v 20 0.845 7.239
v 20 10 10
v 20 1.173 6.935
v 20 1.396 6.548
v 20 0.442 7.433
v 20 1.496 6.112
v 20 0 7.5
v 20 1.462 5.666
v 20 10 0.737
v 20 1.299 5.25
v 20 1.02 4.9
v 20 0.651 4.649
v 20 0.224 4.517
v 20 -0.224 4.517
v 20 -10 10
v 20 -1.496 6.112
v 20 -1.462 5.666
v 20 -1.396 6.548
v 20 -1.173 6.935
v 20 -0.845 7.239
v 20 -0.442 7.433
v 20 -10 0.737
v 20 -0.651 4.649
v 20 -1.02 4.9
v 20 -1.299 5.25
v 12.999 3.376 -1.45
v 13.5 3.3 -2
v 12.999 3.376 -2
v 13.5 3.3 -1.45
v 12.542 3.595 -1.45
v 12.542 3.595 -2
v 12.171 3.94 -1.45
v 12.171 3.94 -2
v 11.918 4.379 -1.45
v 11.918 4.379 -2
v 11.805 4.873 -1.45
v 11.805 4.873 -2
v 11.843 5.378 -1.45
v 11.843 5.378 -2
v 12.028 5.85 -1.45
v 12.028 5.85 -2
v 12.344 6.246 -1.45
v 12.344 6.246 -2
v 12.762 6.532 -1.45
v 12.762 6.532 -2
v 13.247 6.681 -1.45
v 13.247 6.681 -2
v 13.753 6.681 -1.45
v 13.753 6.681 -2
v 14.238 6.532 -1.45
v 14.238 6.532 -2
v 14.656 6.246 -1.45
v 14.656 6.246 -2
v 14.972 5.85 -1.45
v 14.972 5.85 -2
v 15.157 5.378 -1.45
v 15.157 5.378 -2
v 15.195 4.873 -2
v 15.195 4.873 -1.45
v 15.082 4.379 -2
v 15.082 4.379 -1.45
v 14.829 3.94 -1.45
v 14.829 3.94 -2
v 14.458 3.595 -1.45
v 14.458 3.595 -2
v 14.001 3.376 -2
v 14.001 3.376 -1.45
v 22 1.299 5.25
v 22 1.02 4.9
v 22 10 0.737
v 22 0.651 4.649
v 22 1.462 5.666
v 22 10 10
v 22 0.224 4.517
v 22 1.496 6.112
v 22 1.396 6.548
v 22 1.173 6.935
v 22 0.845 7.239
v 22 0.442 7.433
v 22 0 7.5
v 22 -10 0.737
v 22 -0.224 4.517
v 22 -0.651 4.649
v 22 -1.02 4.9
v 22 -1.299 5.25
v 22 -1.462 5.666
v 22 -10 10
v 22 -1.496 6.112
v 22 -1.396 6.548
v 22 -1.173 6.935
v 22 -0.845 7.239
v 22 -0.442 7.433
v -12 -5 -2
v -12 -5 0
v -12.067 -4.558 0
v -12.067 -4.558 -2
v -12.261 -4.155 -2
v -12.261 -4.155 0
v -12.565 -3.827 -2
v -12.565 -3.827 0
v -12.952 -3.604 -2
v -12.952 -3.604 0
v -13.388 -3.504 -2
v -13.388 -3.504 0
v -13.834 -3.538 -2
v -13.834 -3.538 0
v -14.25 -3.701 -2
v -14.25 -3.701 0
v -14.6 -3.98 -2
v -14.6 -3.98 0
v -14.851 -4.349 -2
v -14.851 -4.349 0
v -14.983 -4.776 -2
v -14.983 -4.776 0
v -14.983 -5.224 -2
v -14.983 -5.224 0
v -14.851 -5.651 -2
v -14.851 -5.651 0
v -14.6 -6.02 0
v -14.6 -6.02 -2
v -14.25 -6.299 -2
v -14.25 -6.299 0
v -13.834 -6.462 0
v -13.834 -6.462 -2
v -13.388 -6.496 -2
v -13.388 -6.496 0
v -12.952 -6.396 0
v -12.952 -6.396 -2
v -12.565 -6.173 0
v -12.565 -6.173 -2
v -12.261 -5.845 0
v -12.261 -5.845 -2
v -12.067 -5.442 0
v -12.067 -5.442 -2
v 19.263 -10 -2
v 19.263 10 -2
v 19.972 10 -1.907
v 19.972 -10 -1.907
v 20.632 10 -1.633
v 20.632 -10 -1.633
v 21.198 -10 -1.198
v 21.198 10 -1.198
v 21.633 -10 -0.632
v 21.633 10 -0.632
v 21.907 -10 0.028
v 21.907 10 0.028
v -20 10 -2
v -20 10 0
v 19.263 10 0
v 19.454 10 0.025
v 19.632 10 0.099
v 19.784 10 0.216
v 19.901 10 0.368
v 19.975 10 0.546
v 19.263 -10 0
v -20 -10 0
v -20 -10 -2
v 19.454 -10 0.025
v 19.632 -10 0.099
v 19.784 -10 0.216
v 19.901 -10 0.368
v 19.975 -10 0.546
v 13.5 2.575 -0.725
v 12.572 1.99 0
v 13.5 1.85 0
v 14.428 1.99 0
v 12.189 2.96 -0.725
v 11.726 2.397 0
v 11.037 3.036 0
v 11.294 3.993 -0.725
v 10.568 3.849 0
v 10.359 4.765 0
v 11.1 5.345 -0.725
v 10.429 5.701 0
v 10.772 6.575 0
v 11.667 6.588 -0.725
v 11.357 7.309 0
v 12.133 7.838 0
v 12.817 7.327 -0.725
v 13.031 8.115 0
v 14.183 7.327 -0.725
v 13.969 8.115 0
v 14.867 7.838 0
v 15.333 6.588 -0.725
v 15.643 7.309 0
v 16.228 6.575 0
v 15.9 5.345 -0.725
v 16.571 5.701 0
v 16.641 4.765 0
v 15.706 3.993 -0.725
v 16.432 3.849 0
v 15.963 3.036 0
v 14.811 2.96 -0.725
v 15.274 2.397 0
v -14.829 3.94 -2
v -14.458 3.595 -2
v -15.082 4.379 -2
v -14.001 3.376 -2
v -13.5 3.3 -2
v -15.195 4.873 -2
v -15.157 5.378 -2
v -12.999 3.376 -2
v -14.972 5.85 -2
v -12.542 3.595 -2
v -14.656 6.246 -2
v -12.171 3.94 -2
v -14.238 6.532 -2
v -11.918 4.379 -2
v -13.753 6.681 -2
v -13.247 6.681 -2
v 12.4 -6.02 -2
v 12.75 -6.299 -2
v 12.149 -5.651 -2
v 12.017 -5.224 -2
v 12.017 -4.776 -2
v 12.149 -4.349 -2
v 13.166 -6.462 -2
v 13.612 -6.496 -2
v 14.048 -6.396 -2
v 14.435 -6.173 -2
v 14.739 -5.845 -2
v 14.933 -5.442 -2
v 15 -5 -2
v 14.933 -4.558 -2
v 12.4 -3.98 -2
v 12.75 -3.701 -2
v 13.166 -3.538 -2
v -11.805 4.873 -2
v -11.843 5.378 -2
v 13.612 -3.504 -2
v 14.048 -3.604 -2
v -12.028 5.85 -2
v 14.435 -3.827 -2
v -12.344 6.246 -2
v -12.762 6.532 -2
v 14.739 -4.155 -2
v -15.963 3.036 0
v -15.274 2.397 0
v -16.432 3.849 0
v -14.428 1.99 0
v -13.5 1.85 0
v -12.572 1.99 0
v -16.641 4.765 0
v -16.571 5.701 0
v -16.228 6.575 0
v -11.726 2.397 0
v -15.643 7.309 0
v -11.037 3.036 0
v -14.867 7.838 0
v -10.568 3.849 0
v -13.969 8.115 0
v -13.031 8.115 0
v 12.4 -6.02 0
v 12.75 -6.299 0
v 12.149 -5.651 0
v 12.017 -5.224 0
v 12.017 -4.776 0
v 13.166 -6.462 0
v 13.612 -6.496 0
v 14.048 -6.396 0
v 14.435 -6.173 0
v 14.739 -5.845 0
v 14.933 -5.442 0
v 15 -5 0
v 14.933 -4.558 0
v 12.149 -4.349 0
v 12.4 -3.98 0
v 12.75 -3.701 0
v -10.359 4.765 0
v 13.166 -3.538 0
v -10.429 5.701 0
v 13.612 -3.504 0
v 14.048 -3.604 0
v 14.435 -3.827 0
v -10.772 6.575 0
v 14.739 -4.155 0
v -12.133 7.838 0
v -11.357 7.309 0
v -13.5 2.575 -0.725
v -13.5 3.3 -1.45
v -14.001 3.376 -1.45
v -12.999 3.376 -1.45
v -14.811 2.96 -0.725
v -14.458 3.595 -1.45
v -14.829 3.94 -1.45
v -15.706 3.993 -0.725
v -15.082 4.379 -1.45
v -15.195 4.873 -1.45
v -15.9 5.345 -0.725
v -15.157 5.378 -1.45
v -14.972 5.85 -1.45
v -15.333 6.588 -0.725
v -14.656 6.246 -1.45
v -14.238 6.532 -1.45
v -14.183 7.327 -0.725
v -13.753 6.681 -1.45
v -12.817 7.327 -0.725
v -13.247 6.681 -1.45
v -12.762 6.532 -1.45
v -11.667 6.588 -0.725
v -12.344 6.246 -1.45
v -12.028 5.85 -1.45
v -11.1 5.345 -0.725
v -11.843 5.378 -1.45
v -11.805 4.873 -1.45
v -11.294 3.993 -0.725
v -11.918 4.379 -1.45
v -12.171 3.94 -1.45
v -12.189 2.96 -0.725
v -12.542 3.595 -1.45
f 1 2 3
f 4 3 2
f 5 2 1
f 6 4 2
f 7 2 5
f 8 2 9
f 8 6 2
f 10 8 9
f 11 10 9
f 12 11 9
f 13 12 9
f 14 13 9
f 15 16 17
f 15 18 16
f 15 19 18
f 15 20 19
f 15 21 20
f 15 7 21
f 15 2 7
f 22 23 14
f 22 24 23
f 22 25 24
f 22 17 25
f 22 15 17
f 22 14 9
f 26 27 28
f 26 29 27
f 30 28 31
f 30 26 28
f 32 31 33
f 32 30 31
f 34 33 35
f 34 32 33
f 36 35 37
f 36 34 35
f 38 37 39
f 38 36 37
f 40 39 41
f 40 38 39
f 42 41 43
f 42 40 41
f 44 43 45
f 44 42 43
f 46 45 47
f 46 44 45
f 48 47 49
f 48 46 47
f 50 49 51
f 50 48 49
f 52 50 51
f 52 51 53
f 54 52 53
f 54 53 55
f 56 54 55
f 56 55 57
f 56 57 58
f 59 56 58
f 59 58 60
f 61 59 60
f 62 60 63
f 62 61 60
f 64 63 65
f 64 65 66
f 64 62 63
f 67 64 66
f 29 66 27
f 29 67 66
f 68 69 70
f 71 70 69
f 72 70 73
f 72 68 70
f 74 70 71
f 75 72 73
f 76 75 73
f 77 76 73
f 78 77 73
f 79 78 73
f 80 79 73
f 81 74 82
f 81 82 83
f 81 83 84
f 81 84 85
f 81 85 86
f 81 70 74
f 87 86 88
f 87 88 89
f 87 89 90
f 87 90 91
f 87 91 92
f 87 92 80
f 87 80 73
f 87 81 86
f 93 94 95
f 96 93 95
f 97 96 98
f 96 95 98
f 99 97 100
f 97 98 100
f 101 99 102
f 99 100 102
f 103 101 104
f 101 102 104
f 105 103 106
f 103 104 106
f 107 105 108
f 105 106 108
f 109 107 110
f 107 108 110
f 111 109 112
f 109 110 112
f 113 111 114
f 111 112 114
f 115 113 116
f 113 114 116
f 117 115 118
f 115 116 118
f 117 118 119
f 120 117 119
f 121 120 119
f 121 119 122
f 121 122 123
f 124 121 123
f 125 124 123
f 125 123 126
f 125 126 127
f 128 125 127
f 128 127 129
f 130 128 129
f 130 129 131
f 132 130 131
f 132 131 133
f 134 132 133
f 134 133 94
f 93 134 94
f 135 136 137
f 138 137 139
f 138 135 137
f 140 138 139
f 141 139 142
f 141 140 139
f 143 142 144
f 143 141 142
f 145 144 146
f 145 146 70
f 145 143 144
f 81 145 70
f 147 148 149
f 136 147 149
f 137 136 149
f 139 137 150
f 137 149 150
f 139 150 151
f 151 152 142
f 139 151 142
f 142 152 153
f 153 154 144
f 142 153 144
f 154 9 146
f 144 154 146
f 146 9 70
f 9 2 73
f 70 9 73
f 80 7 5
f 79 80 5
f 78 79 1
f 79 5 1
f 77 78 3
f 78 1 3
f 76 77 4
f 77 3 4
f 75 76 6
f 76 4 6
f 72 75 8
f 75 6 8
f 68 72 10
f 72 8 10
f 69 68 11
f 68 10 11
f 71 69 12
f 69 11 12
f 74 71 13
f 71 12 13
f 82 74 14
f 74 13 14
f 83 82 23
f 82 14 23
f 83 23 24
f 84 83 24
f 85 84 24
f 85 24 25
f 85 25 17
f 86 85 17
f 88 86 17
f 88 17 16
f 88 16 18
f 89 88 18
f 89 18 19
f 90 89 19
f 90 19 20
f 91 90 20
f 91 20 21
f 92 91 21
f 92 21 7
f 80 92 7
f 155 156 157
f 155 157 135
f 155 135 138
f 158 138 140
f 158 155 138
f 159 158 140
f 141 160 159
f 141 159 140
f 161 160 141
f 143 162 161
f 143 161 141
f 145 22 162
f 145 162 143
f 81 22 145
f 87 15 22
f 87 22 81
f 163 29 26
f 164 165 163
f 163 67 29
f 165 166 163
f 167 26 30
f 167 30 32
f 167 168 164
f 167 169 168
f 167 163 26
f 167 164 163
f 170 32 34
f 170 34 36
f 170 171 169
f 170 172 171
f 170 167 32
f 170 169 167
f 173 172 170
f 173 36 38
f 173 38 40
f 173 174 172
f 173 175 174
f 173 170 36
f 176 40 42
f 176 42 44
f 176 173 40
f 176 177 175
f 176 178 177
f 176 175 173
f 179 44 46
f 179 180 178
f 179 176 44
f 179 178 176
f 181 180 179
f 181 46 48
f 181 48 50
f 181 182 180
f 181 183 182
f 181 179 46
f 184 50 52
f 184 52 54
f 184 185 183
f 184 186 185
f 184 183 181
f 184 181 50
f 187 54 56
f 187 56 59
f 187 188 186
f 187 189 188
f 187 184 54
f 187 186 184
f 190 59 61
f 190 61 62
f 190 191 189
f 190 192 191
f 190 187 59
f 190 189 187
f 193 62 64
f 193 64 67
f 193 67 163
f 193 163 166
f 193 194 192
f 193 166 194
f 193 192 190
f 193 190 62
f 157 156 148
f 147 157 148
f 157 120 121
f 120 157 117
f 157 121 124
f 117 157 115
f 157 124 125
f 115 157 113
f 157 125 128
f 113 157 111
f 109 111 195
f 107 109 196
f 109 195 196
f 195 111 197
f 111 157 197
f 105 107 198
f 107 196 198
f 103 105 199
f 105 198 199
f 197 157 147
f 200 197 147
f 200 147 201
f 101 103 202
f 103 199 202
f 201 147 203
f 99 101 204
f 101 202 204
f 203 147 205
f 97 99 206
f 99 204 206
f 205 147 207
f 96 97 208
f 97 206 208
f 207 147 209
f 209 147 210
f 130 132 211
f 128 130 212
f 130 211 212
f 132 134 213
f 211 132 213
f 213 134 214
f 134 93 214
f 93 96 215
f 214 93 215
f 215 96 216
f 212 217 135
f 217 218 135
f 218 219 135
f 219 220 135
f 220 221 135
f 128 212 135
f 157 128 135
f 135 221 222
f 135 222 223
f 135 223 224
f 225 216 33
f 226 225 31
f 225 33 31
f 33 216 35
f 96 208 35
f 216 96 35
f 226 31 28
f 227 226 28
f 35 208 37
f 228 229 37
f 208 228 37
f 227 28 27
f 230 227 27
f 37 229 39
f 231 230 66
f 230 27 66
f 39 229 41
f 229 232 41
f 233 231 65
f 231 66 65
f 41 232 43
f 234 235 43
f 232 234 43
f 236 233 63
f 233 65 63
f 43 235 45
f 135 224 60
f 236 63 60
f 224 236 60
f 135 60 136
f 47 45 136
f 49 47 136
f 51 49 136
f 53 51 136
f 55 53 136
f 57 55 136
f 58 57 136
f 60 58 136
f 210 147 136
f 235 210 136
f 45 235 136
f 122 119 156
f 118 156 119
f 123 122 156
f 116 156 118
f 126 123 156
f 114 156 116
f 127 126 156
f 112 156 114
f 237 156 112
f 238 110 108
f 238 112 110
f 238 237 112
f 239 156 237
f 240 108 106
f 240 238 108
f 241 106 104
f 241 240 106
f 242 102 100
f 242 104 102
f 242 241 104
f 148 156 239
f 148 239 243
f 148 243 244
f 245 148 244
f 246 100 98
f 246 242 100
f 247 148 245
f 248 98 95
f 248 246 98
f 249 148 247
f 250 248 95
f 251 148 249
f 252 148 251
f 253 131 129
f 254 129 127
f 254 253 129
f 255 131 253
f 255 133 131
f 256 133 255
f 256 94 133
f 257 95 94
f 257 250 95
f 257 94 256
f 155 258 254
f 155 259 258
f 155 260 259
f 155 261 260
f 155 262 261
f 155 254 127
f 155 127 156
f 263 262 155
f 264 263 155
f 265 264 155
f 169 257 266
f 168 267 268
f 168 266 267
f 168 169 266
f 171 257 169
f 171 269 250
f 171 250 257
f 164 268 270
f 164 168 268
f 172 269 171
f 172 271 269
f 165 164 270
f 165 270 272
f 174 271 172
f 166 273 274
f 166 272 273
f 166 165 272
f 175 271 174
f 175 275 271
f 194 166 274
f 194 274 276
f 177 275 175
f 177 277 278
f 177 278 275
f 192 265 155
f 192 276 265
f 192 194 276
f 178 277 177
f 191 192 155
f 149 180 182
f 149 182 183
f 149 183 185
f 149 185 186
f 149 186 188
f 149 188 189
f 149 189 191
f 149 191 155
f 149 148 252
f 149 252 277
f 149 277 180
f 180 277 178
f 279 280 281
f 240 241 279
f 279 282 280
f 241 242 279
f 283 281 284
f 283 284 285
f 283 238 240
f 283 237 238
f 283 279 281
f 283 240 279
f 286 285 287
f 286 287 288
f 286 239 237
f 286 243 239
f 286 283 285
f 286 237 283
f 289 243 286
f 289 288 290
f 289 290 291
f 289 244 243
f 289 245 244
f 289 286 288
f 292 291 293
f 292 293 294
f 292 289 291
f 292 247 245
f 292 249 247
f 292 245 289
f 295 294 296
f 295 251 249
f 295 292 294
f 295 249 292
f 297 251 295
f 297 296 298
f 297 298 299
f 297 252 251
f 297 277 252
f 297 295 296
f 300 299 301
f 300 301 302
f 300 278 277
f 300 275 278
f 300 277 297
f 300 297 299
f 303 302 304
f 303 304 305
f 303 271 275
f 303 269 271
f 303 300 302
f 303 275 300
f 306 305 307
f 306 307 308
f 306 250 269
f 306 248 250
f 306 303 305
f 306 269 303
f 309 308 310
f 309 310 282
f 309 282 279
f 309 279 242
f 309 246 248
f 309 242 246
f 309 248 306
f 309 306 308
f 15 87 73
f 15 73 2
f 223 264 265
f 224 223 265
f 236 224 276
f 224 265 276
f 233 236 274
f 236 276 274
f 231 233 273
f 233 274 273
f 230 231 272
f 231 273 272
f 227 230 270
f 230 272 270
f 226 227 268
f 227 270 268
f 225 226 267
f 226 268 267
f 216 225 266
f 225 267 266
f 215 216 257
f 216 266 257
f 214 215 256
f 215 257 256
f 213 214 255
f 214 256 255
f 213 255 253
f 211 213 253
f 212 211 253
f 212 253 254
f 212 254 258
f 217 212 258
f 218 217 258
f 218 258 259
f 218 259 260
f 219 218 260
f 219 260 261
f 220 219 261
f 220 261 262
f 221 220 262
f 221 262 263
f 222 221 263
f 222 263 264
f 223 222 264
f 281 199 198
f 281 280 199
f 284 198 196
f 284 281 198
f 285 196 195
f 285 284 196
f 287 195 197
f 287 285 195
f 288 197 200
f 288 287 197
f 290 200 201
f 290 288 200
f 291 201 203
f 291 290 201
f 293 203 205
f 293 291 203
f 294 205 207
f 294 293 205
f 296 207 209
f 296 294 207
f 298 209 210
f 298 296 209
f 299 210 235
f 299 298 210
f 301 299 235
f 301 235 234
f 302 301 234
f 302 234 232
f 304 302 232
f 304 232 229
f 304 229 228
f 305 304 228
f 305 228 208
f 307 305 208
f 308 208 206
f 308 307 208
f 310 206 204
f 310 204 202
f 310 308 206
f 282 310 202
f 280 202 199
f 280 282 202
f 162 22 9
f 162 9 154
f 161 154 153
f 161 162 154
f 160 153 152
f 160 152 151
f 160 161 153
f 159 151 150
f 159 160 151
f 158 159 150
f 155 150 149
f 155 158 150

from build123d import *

# Parameters (mm, degrees)
SKETCH_1_W                       = 40
SKETCH_1_H                       = 20
SM_BASE_FLANGE_1_DEPTH           = 2
SM_EDGE_FLANGE_1_STRIP_W         = 9.4732
SM_EDGE_FLANGE_1_STRIP_H         = 2
SM_EDGE_FLANGE_1_STRIP_CUT_DEPTH = 20
SM_EDGE_FLANGE_1_DEPTH           = 20
HOLE_WIZARD_M3_2_AT_2_COUNT      = 2
HOLE_WIZARD_M3_2_AT_2_PITCH      = 27
HOLE_WIZARD_M3_1_D               = 3
HOLE_WIZARD_M3_2_2_D             = 3


# Sheet-metal steps are written as plain solids
with BuildPart() as part:
    # Sketch 1 → 基材-凸緣1 (new body)
    with BuildSketch(Plane.XY):
        Rectangle(SKETCH_1_W, SKETCH_1_H)
    extrude(amount=-SM_BASE_FLANGE_1_DEPTH)

    # 邊線-凸緣1 strip (across the edge) → 邊線-凸緣1 strip cut (cut)
    with BuildSketch(Plane(origin=(20, -10, 0), x_dir=(-1, 0, 0), z_dir=(0, 1, 0))):
        with Locations((-4, -1)):
            Rectangle(SM_EDGE_FLANGE_1_STRIP_W, SM_EDGE_FLANGE_1_STRIP_H)
    extrude(amount=SM_EDGE_FLANGE_1_STRIP_CUT_DEPTH, mode=Mode.SUBTRACT)

    # 邊線-凸緣1 section (across the edge) → 邊線-凸緣1 (add)
    with BuildSketch(Plane(origin=(20, -10, 0), x_dir=(-1, 0, 0), z_dir=(0, 1, 0))):
        with BuildLine():
            Line((-2, 0.7366), (-2, 10))
            Line((-2, 10), (0, 10))
            Line((0, 10), (0, 0.7366))
            ThreePointArc((0, 0.7366), (0.215745145, 0.215745145), (0.7366, 0))
            Line((0.7366, 0), (0.7366, -2))
            ThreePointArc((0.7366, -2), (-1.198468417, -1.198468417), (-2, 0.7366))
        make_face()
    extrude(amount=SM_EDGE_FLANGE_1_DEPTH)

    # 草圖11 → Hole Wizard M3 _2 (revolve, cut)
    with BuildSketch(Plane(origin=(-13.5, 5, 0), x_dir=(0, -1, 0), z_dir=(1, 0, 0))):
        Polygon((0, 0), (0, 2), (1.7, 2), (1.7, 1.45), (3.15, 0), align=None)
    hole_wizard_m3_2 = revolve(axis=Axis((-13.5, 5, 6.35), (0, 0, -1)), mode=Mode.SUBTRACT)

    # Hole Wizard M3 _2 at 2: Hole Wizard M3 _2 ×2
    with Locations(*[(i * HOLE_WIZARD_M3_2_AT_2_PITCH, 0, 0) for i in range(1, HOLE_WIZARD_M3_2_AT_2_COUNT)]):
        add(hole_wizard_m3_2, mode=Mode.SUBTRACT)

    # M3 螺紋孔1 (through all)
    with Locations(Plane(origin=(22, 0, 0), x_dir=(0, 0, -1), z_dir=(1, 0, 0))):
        with Locations((-6, 0)):
            Hole(HOLE_WIZARD_M3_1_D / 2)

    # Hole Wizard M3 _2 2 (through all)
    with Locations(Plane(origin=(0, 0, -2), x_dir=(-1, 0, 0), z_dir=(0, 0, -1))):
        with Locations((-13.5, -5), (13.5, -5)):
            Hole(HOLE_WIZARD_M3_2_2_D / 2)


solid = part.part
